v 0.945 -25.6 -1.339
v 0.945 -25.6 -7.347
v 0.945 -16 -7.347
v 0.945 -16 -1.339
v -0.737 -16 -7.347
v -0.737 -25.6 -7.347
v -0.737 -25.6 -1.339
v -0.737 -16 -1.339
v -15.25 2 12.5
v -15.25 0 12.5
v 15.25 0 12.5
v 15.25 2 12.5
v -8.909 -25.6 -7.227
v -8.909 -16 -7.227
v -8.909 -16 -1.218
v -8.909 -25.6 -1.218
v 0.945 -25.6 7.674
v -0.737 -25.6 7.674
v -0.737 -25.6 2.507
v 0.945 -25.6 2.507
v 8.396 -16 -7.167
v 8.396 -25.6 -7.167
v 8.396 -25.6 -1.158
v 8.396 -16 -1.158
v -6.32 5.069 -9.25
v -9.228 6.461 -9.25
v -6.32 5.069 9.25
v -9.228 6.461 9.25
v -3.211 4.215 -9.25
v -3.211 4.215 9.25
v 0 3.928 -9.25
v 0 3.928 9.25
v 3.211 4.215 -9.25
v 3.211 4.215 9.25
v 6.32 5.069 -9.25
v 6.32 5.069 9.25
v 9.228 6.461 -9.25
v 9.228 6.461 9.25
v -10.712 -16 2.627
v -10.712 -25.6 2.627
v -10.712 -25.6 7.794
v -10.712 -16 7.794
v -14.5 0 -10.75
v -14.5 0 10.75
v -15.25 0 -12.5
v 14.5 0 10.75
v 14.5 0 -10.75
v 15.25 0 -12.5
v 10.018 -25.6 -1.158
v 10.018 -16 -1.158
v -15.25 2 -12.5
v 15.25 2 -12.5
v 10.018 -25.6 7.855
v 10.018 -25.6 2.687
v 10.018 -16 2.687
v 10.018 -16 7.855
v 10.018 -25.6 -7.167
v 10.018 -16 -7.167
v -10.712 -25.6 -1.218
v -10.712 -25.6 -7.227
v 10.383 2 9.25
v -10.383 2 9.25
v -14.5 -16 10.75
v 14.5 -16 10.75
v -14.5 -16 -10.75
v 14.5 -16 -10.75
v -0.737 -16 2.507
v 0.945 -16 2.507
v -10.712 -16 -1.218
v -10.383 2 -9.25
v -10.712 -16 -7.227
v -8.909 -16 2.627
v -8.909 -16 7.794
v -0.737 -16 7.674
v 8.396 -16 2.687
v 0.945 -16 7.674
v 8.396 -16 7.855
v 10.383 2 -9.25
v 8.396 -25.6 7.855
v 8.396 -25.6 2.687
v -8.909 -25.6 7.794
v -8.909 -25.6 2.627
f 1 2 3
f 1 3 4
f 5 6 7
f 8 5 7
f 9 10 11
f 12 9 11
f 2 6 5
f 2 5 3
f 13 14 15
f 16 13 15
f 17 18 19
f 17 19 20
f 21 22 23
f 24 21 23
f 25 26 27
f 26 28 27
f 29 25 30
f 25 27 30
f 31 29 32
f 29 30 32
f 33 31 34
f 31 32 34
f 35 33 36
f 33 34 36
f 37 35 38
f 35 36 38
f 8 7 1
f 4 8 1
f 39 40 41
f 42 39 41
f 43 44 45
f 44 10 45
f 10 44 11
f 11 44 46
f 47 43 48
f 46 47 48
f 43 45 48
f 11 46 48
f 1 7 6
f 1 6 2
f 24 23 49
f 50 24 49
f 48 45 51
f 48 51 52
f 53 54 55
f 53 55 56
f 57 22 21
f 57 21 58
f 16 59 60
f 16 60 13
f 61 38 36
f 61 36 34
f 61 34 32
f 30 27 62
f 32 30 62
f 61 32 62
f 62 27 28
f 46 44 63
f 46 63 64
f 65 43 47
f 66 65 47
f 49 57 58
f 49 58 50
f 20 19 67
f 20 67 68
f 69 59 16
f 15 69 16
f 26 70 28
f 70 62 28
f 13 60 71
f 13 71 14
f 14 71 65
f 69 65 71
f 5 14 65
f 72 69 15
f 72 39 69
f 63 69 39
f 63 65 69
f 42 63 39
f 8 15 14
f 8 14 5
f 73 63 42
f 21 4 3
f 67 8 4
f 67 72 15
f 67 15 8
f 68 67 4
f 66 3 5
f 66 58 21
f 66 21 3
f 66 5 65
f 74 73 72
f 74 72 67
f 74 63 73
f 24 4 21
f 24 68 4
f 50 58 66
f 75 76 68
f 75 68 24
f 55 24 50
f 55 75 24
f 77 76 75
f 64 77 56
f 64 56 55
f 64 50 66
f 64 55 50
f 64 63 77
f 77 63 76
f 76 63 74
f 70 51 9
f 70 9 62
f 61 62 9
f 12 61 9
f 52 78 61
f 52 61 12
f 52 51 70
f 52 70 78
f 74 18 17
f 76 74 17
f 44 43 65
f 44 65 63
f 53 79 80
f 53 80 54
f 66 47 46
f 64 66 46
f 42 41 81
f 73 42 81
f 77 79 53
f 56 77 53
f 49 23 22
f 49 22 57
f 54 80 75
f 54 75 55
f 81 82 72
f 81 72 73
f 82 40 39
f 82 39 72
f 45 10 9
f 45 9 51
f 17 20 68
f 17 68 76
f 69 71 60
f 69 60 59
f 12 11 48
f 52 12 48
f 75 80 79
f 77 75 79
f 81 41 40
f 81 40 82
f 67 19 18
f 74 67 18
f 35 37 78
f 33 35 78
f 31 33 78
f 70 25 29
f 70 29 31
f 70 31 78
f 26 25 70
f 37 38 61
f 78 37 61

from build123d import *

# Parameters (mm, degrees)
SKETCH_1_W      = 30.5
SKETCH_1_H      = 25
EXTRUDE_1_DEPTH = 2
SKETCH_2_W      = 29
SKETCH_2_H      = 21.5
EXTRUDE_2_DEPTH = 16
SKETCH_3_W      = 1.802565081
SKETCH_3_H      = 5.167353231
SKETCH_3_H_2    = 6.008550268
SKETCH_3_W_2    = 1.682394075
SKETCH_3_H_3    = 6.008550269
SKETCH_3_W_3    = 1.622308572
EXTRUDE_3_DEPTH = 9.6
EXTRUDE_4_DEPTH = 9.25


with BuildPart() as part:
    # 草图1 → 凸台-拉伸1 (new body)
    with BuildSketch(Plane(origin=(0, 0, 0), x_dir=(1, 0, 0), z_dir=(0, 1, 0))):
        Rectangle(SKETCH_1_W, SKETCH_1_H)
    extrude(amount=EXTRUDE_1_DEPTH)

    # 草图2 → 凸台-拉伸2 (add)
    with BuildSketch(Plane.XZ):
        Rectangle(SKETCH_2_W, SKETCH_2_H)
    extrude(amount=EXTRUDE_2_DEPTH)

    # 草图3 → 凸台-拉伸3 (add)
    with BuildSketch(Plane.XZ.offset(16)):
        with Locations((-9.810401899, 5.210817025)):
            Rectangle(SKETCH_3_W, SKETCH_3_H)
        with Locations((-9.810401899, -4.222606897)):
            Rectangle(SKETCH_3_W, SKETCH_3_H_2)
        with Locations((0.103706044, 5.09064602)):
            Rectangle(SKETCH_3_W_2, SKETCH_3_H)
        with Locations((0.103706044, -4.342777902)):
            Rectangle(SKETCH_3_W_2, SKETCH_3_H_3)
        with Locations((9.206659702, 5.270902528)):
            Rectangle(SKETCH_3_W_3, SKETCH_3_H)
        with Locations((9.206659702, -4.162521395)):
            Rectangle(SKETCH_3_W_3, SKETCH_3_H_3)
    extrude(amount=EXTRUDE_3_DEPTH)

    # 草图4 → 凸台-拉伸4 (add, symmetric)
    with BuildSketch(Plane.XY):
        with BuildLine():
            Line((10.382594104, 2), (-10.382594104, 2))
            Line((-10.382594104, 2), (-9.22822883, 6.460566864))
            ThreePointArc((-9.22822883, 6.460566864), (-4.784721142, 4.572616283), (0, 3.927975641))
            ThreePointArc((0, 3.927975641), (4.784721142, 4.572616283), (9.22822883, 6.460566864))
            Line((9.22822883, 6.460566864), (10.382594104, 2))
        make_face()
    extrude(amount=EXTRUDE_4_DEPTH, both=True)


solid = part.part
